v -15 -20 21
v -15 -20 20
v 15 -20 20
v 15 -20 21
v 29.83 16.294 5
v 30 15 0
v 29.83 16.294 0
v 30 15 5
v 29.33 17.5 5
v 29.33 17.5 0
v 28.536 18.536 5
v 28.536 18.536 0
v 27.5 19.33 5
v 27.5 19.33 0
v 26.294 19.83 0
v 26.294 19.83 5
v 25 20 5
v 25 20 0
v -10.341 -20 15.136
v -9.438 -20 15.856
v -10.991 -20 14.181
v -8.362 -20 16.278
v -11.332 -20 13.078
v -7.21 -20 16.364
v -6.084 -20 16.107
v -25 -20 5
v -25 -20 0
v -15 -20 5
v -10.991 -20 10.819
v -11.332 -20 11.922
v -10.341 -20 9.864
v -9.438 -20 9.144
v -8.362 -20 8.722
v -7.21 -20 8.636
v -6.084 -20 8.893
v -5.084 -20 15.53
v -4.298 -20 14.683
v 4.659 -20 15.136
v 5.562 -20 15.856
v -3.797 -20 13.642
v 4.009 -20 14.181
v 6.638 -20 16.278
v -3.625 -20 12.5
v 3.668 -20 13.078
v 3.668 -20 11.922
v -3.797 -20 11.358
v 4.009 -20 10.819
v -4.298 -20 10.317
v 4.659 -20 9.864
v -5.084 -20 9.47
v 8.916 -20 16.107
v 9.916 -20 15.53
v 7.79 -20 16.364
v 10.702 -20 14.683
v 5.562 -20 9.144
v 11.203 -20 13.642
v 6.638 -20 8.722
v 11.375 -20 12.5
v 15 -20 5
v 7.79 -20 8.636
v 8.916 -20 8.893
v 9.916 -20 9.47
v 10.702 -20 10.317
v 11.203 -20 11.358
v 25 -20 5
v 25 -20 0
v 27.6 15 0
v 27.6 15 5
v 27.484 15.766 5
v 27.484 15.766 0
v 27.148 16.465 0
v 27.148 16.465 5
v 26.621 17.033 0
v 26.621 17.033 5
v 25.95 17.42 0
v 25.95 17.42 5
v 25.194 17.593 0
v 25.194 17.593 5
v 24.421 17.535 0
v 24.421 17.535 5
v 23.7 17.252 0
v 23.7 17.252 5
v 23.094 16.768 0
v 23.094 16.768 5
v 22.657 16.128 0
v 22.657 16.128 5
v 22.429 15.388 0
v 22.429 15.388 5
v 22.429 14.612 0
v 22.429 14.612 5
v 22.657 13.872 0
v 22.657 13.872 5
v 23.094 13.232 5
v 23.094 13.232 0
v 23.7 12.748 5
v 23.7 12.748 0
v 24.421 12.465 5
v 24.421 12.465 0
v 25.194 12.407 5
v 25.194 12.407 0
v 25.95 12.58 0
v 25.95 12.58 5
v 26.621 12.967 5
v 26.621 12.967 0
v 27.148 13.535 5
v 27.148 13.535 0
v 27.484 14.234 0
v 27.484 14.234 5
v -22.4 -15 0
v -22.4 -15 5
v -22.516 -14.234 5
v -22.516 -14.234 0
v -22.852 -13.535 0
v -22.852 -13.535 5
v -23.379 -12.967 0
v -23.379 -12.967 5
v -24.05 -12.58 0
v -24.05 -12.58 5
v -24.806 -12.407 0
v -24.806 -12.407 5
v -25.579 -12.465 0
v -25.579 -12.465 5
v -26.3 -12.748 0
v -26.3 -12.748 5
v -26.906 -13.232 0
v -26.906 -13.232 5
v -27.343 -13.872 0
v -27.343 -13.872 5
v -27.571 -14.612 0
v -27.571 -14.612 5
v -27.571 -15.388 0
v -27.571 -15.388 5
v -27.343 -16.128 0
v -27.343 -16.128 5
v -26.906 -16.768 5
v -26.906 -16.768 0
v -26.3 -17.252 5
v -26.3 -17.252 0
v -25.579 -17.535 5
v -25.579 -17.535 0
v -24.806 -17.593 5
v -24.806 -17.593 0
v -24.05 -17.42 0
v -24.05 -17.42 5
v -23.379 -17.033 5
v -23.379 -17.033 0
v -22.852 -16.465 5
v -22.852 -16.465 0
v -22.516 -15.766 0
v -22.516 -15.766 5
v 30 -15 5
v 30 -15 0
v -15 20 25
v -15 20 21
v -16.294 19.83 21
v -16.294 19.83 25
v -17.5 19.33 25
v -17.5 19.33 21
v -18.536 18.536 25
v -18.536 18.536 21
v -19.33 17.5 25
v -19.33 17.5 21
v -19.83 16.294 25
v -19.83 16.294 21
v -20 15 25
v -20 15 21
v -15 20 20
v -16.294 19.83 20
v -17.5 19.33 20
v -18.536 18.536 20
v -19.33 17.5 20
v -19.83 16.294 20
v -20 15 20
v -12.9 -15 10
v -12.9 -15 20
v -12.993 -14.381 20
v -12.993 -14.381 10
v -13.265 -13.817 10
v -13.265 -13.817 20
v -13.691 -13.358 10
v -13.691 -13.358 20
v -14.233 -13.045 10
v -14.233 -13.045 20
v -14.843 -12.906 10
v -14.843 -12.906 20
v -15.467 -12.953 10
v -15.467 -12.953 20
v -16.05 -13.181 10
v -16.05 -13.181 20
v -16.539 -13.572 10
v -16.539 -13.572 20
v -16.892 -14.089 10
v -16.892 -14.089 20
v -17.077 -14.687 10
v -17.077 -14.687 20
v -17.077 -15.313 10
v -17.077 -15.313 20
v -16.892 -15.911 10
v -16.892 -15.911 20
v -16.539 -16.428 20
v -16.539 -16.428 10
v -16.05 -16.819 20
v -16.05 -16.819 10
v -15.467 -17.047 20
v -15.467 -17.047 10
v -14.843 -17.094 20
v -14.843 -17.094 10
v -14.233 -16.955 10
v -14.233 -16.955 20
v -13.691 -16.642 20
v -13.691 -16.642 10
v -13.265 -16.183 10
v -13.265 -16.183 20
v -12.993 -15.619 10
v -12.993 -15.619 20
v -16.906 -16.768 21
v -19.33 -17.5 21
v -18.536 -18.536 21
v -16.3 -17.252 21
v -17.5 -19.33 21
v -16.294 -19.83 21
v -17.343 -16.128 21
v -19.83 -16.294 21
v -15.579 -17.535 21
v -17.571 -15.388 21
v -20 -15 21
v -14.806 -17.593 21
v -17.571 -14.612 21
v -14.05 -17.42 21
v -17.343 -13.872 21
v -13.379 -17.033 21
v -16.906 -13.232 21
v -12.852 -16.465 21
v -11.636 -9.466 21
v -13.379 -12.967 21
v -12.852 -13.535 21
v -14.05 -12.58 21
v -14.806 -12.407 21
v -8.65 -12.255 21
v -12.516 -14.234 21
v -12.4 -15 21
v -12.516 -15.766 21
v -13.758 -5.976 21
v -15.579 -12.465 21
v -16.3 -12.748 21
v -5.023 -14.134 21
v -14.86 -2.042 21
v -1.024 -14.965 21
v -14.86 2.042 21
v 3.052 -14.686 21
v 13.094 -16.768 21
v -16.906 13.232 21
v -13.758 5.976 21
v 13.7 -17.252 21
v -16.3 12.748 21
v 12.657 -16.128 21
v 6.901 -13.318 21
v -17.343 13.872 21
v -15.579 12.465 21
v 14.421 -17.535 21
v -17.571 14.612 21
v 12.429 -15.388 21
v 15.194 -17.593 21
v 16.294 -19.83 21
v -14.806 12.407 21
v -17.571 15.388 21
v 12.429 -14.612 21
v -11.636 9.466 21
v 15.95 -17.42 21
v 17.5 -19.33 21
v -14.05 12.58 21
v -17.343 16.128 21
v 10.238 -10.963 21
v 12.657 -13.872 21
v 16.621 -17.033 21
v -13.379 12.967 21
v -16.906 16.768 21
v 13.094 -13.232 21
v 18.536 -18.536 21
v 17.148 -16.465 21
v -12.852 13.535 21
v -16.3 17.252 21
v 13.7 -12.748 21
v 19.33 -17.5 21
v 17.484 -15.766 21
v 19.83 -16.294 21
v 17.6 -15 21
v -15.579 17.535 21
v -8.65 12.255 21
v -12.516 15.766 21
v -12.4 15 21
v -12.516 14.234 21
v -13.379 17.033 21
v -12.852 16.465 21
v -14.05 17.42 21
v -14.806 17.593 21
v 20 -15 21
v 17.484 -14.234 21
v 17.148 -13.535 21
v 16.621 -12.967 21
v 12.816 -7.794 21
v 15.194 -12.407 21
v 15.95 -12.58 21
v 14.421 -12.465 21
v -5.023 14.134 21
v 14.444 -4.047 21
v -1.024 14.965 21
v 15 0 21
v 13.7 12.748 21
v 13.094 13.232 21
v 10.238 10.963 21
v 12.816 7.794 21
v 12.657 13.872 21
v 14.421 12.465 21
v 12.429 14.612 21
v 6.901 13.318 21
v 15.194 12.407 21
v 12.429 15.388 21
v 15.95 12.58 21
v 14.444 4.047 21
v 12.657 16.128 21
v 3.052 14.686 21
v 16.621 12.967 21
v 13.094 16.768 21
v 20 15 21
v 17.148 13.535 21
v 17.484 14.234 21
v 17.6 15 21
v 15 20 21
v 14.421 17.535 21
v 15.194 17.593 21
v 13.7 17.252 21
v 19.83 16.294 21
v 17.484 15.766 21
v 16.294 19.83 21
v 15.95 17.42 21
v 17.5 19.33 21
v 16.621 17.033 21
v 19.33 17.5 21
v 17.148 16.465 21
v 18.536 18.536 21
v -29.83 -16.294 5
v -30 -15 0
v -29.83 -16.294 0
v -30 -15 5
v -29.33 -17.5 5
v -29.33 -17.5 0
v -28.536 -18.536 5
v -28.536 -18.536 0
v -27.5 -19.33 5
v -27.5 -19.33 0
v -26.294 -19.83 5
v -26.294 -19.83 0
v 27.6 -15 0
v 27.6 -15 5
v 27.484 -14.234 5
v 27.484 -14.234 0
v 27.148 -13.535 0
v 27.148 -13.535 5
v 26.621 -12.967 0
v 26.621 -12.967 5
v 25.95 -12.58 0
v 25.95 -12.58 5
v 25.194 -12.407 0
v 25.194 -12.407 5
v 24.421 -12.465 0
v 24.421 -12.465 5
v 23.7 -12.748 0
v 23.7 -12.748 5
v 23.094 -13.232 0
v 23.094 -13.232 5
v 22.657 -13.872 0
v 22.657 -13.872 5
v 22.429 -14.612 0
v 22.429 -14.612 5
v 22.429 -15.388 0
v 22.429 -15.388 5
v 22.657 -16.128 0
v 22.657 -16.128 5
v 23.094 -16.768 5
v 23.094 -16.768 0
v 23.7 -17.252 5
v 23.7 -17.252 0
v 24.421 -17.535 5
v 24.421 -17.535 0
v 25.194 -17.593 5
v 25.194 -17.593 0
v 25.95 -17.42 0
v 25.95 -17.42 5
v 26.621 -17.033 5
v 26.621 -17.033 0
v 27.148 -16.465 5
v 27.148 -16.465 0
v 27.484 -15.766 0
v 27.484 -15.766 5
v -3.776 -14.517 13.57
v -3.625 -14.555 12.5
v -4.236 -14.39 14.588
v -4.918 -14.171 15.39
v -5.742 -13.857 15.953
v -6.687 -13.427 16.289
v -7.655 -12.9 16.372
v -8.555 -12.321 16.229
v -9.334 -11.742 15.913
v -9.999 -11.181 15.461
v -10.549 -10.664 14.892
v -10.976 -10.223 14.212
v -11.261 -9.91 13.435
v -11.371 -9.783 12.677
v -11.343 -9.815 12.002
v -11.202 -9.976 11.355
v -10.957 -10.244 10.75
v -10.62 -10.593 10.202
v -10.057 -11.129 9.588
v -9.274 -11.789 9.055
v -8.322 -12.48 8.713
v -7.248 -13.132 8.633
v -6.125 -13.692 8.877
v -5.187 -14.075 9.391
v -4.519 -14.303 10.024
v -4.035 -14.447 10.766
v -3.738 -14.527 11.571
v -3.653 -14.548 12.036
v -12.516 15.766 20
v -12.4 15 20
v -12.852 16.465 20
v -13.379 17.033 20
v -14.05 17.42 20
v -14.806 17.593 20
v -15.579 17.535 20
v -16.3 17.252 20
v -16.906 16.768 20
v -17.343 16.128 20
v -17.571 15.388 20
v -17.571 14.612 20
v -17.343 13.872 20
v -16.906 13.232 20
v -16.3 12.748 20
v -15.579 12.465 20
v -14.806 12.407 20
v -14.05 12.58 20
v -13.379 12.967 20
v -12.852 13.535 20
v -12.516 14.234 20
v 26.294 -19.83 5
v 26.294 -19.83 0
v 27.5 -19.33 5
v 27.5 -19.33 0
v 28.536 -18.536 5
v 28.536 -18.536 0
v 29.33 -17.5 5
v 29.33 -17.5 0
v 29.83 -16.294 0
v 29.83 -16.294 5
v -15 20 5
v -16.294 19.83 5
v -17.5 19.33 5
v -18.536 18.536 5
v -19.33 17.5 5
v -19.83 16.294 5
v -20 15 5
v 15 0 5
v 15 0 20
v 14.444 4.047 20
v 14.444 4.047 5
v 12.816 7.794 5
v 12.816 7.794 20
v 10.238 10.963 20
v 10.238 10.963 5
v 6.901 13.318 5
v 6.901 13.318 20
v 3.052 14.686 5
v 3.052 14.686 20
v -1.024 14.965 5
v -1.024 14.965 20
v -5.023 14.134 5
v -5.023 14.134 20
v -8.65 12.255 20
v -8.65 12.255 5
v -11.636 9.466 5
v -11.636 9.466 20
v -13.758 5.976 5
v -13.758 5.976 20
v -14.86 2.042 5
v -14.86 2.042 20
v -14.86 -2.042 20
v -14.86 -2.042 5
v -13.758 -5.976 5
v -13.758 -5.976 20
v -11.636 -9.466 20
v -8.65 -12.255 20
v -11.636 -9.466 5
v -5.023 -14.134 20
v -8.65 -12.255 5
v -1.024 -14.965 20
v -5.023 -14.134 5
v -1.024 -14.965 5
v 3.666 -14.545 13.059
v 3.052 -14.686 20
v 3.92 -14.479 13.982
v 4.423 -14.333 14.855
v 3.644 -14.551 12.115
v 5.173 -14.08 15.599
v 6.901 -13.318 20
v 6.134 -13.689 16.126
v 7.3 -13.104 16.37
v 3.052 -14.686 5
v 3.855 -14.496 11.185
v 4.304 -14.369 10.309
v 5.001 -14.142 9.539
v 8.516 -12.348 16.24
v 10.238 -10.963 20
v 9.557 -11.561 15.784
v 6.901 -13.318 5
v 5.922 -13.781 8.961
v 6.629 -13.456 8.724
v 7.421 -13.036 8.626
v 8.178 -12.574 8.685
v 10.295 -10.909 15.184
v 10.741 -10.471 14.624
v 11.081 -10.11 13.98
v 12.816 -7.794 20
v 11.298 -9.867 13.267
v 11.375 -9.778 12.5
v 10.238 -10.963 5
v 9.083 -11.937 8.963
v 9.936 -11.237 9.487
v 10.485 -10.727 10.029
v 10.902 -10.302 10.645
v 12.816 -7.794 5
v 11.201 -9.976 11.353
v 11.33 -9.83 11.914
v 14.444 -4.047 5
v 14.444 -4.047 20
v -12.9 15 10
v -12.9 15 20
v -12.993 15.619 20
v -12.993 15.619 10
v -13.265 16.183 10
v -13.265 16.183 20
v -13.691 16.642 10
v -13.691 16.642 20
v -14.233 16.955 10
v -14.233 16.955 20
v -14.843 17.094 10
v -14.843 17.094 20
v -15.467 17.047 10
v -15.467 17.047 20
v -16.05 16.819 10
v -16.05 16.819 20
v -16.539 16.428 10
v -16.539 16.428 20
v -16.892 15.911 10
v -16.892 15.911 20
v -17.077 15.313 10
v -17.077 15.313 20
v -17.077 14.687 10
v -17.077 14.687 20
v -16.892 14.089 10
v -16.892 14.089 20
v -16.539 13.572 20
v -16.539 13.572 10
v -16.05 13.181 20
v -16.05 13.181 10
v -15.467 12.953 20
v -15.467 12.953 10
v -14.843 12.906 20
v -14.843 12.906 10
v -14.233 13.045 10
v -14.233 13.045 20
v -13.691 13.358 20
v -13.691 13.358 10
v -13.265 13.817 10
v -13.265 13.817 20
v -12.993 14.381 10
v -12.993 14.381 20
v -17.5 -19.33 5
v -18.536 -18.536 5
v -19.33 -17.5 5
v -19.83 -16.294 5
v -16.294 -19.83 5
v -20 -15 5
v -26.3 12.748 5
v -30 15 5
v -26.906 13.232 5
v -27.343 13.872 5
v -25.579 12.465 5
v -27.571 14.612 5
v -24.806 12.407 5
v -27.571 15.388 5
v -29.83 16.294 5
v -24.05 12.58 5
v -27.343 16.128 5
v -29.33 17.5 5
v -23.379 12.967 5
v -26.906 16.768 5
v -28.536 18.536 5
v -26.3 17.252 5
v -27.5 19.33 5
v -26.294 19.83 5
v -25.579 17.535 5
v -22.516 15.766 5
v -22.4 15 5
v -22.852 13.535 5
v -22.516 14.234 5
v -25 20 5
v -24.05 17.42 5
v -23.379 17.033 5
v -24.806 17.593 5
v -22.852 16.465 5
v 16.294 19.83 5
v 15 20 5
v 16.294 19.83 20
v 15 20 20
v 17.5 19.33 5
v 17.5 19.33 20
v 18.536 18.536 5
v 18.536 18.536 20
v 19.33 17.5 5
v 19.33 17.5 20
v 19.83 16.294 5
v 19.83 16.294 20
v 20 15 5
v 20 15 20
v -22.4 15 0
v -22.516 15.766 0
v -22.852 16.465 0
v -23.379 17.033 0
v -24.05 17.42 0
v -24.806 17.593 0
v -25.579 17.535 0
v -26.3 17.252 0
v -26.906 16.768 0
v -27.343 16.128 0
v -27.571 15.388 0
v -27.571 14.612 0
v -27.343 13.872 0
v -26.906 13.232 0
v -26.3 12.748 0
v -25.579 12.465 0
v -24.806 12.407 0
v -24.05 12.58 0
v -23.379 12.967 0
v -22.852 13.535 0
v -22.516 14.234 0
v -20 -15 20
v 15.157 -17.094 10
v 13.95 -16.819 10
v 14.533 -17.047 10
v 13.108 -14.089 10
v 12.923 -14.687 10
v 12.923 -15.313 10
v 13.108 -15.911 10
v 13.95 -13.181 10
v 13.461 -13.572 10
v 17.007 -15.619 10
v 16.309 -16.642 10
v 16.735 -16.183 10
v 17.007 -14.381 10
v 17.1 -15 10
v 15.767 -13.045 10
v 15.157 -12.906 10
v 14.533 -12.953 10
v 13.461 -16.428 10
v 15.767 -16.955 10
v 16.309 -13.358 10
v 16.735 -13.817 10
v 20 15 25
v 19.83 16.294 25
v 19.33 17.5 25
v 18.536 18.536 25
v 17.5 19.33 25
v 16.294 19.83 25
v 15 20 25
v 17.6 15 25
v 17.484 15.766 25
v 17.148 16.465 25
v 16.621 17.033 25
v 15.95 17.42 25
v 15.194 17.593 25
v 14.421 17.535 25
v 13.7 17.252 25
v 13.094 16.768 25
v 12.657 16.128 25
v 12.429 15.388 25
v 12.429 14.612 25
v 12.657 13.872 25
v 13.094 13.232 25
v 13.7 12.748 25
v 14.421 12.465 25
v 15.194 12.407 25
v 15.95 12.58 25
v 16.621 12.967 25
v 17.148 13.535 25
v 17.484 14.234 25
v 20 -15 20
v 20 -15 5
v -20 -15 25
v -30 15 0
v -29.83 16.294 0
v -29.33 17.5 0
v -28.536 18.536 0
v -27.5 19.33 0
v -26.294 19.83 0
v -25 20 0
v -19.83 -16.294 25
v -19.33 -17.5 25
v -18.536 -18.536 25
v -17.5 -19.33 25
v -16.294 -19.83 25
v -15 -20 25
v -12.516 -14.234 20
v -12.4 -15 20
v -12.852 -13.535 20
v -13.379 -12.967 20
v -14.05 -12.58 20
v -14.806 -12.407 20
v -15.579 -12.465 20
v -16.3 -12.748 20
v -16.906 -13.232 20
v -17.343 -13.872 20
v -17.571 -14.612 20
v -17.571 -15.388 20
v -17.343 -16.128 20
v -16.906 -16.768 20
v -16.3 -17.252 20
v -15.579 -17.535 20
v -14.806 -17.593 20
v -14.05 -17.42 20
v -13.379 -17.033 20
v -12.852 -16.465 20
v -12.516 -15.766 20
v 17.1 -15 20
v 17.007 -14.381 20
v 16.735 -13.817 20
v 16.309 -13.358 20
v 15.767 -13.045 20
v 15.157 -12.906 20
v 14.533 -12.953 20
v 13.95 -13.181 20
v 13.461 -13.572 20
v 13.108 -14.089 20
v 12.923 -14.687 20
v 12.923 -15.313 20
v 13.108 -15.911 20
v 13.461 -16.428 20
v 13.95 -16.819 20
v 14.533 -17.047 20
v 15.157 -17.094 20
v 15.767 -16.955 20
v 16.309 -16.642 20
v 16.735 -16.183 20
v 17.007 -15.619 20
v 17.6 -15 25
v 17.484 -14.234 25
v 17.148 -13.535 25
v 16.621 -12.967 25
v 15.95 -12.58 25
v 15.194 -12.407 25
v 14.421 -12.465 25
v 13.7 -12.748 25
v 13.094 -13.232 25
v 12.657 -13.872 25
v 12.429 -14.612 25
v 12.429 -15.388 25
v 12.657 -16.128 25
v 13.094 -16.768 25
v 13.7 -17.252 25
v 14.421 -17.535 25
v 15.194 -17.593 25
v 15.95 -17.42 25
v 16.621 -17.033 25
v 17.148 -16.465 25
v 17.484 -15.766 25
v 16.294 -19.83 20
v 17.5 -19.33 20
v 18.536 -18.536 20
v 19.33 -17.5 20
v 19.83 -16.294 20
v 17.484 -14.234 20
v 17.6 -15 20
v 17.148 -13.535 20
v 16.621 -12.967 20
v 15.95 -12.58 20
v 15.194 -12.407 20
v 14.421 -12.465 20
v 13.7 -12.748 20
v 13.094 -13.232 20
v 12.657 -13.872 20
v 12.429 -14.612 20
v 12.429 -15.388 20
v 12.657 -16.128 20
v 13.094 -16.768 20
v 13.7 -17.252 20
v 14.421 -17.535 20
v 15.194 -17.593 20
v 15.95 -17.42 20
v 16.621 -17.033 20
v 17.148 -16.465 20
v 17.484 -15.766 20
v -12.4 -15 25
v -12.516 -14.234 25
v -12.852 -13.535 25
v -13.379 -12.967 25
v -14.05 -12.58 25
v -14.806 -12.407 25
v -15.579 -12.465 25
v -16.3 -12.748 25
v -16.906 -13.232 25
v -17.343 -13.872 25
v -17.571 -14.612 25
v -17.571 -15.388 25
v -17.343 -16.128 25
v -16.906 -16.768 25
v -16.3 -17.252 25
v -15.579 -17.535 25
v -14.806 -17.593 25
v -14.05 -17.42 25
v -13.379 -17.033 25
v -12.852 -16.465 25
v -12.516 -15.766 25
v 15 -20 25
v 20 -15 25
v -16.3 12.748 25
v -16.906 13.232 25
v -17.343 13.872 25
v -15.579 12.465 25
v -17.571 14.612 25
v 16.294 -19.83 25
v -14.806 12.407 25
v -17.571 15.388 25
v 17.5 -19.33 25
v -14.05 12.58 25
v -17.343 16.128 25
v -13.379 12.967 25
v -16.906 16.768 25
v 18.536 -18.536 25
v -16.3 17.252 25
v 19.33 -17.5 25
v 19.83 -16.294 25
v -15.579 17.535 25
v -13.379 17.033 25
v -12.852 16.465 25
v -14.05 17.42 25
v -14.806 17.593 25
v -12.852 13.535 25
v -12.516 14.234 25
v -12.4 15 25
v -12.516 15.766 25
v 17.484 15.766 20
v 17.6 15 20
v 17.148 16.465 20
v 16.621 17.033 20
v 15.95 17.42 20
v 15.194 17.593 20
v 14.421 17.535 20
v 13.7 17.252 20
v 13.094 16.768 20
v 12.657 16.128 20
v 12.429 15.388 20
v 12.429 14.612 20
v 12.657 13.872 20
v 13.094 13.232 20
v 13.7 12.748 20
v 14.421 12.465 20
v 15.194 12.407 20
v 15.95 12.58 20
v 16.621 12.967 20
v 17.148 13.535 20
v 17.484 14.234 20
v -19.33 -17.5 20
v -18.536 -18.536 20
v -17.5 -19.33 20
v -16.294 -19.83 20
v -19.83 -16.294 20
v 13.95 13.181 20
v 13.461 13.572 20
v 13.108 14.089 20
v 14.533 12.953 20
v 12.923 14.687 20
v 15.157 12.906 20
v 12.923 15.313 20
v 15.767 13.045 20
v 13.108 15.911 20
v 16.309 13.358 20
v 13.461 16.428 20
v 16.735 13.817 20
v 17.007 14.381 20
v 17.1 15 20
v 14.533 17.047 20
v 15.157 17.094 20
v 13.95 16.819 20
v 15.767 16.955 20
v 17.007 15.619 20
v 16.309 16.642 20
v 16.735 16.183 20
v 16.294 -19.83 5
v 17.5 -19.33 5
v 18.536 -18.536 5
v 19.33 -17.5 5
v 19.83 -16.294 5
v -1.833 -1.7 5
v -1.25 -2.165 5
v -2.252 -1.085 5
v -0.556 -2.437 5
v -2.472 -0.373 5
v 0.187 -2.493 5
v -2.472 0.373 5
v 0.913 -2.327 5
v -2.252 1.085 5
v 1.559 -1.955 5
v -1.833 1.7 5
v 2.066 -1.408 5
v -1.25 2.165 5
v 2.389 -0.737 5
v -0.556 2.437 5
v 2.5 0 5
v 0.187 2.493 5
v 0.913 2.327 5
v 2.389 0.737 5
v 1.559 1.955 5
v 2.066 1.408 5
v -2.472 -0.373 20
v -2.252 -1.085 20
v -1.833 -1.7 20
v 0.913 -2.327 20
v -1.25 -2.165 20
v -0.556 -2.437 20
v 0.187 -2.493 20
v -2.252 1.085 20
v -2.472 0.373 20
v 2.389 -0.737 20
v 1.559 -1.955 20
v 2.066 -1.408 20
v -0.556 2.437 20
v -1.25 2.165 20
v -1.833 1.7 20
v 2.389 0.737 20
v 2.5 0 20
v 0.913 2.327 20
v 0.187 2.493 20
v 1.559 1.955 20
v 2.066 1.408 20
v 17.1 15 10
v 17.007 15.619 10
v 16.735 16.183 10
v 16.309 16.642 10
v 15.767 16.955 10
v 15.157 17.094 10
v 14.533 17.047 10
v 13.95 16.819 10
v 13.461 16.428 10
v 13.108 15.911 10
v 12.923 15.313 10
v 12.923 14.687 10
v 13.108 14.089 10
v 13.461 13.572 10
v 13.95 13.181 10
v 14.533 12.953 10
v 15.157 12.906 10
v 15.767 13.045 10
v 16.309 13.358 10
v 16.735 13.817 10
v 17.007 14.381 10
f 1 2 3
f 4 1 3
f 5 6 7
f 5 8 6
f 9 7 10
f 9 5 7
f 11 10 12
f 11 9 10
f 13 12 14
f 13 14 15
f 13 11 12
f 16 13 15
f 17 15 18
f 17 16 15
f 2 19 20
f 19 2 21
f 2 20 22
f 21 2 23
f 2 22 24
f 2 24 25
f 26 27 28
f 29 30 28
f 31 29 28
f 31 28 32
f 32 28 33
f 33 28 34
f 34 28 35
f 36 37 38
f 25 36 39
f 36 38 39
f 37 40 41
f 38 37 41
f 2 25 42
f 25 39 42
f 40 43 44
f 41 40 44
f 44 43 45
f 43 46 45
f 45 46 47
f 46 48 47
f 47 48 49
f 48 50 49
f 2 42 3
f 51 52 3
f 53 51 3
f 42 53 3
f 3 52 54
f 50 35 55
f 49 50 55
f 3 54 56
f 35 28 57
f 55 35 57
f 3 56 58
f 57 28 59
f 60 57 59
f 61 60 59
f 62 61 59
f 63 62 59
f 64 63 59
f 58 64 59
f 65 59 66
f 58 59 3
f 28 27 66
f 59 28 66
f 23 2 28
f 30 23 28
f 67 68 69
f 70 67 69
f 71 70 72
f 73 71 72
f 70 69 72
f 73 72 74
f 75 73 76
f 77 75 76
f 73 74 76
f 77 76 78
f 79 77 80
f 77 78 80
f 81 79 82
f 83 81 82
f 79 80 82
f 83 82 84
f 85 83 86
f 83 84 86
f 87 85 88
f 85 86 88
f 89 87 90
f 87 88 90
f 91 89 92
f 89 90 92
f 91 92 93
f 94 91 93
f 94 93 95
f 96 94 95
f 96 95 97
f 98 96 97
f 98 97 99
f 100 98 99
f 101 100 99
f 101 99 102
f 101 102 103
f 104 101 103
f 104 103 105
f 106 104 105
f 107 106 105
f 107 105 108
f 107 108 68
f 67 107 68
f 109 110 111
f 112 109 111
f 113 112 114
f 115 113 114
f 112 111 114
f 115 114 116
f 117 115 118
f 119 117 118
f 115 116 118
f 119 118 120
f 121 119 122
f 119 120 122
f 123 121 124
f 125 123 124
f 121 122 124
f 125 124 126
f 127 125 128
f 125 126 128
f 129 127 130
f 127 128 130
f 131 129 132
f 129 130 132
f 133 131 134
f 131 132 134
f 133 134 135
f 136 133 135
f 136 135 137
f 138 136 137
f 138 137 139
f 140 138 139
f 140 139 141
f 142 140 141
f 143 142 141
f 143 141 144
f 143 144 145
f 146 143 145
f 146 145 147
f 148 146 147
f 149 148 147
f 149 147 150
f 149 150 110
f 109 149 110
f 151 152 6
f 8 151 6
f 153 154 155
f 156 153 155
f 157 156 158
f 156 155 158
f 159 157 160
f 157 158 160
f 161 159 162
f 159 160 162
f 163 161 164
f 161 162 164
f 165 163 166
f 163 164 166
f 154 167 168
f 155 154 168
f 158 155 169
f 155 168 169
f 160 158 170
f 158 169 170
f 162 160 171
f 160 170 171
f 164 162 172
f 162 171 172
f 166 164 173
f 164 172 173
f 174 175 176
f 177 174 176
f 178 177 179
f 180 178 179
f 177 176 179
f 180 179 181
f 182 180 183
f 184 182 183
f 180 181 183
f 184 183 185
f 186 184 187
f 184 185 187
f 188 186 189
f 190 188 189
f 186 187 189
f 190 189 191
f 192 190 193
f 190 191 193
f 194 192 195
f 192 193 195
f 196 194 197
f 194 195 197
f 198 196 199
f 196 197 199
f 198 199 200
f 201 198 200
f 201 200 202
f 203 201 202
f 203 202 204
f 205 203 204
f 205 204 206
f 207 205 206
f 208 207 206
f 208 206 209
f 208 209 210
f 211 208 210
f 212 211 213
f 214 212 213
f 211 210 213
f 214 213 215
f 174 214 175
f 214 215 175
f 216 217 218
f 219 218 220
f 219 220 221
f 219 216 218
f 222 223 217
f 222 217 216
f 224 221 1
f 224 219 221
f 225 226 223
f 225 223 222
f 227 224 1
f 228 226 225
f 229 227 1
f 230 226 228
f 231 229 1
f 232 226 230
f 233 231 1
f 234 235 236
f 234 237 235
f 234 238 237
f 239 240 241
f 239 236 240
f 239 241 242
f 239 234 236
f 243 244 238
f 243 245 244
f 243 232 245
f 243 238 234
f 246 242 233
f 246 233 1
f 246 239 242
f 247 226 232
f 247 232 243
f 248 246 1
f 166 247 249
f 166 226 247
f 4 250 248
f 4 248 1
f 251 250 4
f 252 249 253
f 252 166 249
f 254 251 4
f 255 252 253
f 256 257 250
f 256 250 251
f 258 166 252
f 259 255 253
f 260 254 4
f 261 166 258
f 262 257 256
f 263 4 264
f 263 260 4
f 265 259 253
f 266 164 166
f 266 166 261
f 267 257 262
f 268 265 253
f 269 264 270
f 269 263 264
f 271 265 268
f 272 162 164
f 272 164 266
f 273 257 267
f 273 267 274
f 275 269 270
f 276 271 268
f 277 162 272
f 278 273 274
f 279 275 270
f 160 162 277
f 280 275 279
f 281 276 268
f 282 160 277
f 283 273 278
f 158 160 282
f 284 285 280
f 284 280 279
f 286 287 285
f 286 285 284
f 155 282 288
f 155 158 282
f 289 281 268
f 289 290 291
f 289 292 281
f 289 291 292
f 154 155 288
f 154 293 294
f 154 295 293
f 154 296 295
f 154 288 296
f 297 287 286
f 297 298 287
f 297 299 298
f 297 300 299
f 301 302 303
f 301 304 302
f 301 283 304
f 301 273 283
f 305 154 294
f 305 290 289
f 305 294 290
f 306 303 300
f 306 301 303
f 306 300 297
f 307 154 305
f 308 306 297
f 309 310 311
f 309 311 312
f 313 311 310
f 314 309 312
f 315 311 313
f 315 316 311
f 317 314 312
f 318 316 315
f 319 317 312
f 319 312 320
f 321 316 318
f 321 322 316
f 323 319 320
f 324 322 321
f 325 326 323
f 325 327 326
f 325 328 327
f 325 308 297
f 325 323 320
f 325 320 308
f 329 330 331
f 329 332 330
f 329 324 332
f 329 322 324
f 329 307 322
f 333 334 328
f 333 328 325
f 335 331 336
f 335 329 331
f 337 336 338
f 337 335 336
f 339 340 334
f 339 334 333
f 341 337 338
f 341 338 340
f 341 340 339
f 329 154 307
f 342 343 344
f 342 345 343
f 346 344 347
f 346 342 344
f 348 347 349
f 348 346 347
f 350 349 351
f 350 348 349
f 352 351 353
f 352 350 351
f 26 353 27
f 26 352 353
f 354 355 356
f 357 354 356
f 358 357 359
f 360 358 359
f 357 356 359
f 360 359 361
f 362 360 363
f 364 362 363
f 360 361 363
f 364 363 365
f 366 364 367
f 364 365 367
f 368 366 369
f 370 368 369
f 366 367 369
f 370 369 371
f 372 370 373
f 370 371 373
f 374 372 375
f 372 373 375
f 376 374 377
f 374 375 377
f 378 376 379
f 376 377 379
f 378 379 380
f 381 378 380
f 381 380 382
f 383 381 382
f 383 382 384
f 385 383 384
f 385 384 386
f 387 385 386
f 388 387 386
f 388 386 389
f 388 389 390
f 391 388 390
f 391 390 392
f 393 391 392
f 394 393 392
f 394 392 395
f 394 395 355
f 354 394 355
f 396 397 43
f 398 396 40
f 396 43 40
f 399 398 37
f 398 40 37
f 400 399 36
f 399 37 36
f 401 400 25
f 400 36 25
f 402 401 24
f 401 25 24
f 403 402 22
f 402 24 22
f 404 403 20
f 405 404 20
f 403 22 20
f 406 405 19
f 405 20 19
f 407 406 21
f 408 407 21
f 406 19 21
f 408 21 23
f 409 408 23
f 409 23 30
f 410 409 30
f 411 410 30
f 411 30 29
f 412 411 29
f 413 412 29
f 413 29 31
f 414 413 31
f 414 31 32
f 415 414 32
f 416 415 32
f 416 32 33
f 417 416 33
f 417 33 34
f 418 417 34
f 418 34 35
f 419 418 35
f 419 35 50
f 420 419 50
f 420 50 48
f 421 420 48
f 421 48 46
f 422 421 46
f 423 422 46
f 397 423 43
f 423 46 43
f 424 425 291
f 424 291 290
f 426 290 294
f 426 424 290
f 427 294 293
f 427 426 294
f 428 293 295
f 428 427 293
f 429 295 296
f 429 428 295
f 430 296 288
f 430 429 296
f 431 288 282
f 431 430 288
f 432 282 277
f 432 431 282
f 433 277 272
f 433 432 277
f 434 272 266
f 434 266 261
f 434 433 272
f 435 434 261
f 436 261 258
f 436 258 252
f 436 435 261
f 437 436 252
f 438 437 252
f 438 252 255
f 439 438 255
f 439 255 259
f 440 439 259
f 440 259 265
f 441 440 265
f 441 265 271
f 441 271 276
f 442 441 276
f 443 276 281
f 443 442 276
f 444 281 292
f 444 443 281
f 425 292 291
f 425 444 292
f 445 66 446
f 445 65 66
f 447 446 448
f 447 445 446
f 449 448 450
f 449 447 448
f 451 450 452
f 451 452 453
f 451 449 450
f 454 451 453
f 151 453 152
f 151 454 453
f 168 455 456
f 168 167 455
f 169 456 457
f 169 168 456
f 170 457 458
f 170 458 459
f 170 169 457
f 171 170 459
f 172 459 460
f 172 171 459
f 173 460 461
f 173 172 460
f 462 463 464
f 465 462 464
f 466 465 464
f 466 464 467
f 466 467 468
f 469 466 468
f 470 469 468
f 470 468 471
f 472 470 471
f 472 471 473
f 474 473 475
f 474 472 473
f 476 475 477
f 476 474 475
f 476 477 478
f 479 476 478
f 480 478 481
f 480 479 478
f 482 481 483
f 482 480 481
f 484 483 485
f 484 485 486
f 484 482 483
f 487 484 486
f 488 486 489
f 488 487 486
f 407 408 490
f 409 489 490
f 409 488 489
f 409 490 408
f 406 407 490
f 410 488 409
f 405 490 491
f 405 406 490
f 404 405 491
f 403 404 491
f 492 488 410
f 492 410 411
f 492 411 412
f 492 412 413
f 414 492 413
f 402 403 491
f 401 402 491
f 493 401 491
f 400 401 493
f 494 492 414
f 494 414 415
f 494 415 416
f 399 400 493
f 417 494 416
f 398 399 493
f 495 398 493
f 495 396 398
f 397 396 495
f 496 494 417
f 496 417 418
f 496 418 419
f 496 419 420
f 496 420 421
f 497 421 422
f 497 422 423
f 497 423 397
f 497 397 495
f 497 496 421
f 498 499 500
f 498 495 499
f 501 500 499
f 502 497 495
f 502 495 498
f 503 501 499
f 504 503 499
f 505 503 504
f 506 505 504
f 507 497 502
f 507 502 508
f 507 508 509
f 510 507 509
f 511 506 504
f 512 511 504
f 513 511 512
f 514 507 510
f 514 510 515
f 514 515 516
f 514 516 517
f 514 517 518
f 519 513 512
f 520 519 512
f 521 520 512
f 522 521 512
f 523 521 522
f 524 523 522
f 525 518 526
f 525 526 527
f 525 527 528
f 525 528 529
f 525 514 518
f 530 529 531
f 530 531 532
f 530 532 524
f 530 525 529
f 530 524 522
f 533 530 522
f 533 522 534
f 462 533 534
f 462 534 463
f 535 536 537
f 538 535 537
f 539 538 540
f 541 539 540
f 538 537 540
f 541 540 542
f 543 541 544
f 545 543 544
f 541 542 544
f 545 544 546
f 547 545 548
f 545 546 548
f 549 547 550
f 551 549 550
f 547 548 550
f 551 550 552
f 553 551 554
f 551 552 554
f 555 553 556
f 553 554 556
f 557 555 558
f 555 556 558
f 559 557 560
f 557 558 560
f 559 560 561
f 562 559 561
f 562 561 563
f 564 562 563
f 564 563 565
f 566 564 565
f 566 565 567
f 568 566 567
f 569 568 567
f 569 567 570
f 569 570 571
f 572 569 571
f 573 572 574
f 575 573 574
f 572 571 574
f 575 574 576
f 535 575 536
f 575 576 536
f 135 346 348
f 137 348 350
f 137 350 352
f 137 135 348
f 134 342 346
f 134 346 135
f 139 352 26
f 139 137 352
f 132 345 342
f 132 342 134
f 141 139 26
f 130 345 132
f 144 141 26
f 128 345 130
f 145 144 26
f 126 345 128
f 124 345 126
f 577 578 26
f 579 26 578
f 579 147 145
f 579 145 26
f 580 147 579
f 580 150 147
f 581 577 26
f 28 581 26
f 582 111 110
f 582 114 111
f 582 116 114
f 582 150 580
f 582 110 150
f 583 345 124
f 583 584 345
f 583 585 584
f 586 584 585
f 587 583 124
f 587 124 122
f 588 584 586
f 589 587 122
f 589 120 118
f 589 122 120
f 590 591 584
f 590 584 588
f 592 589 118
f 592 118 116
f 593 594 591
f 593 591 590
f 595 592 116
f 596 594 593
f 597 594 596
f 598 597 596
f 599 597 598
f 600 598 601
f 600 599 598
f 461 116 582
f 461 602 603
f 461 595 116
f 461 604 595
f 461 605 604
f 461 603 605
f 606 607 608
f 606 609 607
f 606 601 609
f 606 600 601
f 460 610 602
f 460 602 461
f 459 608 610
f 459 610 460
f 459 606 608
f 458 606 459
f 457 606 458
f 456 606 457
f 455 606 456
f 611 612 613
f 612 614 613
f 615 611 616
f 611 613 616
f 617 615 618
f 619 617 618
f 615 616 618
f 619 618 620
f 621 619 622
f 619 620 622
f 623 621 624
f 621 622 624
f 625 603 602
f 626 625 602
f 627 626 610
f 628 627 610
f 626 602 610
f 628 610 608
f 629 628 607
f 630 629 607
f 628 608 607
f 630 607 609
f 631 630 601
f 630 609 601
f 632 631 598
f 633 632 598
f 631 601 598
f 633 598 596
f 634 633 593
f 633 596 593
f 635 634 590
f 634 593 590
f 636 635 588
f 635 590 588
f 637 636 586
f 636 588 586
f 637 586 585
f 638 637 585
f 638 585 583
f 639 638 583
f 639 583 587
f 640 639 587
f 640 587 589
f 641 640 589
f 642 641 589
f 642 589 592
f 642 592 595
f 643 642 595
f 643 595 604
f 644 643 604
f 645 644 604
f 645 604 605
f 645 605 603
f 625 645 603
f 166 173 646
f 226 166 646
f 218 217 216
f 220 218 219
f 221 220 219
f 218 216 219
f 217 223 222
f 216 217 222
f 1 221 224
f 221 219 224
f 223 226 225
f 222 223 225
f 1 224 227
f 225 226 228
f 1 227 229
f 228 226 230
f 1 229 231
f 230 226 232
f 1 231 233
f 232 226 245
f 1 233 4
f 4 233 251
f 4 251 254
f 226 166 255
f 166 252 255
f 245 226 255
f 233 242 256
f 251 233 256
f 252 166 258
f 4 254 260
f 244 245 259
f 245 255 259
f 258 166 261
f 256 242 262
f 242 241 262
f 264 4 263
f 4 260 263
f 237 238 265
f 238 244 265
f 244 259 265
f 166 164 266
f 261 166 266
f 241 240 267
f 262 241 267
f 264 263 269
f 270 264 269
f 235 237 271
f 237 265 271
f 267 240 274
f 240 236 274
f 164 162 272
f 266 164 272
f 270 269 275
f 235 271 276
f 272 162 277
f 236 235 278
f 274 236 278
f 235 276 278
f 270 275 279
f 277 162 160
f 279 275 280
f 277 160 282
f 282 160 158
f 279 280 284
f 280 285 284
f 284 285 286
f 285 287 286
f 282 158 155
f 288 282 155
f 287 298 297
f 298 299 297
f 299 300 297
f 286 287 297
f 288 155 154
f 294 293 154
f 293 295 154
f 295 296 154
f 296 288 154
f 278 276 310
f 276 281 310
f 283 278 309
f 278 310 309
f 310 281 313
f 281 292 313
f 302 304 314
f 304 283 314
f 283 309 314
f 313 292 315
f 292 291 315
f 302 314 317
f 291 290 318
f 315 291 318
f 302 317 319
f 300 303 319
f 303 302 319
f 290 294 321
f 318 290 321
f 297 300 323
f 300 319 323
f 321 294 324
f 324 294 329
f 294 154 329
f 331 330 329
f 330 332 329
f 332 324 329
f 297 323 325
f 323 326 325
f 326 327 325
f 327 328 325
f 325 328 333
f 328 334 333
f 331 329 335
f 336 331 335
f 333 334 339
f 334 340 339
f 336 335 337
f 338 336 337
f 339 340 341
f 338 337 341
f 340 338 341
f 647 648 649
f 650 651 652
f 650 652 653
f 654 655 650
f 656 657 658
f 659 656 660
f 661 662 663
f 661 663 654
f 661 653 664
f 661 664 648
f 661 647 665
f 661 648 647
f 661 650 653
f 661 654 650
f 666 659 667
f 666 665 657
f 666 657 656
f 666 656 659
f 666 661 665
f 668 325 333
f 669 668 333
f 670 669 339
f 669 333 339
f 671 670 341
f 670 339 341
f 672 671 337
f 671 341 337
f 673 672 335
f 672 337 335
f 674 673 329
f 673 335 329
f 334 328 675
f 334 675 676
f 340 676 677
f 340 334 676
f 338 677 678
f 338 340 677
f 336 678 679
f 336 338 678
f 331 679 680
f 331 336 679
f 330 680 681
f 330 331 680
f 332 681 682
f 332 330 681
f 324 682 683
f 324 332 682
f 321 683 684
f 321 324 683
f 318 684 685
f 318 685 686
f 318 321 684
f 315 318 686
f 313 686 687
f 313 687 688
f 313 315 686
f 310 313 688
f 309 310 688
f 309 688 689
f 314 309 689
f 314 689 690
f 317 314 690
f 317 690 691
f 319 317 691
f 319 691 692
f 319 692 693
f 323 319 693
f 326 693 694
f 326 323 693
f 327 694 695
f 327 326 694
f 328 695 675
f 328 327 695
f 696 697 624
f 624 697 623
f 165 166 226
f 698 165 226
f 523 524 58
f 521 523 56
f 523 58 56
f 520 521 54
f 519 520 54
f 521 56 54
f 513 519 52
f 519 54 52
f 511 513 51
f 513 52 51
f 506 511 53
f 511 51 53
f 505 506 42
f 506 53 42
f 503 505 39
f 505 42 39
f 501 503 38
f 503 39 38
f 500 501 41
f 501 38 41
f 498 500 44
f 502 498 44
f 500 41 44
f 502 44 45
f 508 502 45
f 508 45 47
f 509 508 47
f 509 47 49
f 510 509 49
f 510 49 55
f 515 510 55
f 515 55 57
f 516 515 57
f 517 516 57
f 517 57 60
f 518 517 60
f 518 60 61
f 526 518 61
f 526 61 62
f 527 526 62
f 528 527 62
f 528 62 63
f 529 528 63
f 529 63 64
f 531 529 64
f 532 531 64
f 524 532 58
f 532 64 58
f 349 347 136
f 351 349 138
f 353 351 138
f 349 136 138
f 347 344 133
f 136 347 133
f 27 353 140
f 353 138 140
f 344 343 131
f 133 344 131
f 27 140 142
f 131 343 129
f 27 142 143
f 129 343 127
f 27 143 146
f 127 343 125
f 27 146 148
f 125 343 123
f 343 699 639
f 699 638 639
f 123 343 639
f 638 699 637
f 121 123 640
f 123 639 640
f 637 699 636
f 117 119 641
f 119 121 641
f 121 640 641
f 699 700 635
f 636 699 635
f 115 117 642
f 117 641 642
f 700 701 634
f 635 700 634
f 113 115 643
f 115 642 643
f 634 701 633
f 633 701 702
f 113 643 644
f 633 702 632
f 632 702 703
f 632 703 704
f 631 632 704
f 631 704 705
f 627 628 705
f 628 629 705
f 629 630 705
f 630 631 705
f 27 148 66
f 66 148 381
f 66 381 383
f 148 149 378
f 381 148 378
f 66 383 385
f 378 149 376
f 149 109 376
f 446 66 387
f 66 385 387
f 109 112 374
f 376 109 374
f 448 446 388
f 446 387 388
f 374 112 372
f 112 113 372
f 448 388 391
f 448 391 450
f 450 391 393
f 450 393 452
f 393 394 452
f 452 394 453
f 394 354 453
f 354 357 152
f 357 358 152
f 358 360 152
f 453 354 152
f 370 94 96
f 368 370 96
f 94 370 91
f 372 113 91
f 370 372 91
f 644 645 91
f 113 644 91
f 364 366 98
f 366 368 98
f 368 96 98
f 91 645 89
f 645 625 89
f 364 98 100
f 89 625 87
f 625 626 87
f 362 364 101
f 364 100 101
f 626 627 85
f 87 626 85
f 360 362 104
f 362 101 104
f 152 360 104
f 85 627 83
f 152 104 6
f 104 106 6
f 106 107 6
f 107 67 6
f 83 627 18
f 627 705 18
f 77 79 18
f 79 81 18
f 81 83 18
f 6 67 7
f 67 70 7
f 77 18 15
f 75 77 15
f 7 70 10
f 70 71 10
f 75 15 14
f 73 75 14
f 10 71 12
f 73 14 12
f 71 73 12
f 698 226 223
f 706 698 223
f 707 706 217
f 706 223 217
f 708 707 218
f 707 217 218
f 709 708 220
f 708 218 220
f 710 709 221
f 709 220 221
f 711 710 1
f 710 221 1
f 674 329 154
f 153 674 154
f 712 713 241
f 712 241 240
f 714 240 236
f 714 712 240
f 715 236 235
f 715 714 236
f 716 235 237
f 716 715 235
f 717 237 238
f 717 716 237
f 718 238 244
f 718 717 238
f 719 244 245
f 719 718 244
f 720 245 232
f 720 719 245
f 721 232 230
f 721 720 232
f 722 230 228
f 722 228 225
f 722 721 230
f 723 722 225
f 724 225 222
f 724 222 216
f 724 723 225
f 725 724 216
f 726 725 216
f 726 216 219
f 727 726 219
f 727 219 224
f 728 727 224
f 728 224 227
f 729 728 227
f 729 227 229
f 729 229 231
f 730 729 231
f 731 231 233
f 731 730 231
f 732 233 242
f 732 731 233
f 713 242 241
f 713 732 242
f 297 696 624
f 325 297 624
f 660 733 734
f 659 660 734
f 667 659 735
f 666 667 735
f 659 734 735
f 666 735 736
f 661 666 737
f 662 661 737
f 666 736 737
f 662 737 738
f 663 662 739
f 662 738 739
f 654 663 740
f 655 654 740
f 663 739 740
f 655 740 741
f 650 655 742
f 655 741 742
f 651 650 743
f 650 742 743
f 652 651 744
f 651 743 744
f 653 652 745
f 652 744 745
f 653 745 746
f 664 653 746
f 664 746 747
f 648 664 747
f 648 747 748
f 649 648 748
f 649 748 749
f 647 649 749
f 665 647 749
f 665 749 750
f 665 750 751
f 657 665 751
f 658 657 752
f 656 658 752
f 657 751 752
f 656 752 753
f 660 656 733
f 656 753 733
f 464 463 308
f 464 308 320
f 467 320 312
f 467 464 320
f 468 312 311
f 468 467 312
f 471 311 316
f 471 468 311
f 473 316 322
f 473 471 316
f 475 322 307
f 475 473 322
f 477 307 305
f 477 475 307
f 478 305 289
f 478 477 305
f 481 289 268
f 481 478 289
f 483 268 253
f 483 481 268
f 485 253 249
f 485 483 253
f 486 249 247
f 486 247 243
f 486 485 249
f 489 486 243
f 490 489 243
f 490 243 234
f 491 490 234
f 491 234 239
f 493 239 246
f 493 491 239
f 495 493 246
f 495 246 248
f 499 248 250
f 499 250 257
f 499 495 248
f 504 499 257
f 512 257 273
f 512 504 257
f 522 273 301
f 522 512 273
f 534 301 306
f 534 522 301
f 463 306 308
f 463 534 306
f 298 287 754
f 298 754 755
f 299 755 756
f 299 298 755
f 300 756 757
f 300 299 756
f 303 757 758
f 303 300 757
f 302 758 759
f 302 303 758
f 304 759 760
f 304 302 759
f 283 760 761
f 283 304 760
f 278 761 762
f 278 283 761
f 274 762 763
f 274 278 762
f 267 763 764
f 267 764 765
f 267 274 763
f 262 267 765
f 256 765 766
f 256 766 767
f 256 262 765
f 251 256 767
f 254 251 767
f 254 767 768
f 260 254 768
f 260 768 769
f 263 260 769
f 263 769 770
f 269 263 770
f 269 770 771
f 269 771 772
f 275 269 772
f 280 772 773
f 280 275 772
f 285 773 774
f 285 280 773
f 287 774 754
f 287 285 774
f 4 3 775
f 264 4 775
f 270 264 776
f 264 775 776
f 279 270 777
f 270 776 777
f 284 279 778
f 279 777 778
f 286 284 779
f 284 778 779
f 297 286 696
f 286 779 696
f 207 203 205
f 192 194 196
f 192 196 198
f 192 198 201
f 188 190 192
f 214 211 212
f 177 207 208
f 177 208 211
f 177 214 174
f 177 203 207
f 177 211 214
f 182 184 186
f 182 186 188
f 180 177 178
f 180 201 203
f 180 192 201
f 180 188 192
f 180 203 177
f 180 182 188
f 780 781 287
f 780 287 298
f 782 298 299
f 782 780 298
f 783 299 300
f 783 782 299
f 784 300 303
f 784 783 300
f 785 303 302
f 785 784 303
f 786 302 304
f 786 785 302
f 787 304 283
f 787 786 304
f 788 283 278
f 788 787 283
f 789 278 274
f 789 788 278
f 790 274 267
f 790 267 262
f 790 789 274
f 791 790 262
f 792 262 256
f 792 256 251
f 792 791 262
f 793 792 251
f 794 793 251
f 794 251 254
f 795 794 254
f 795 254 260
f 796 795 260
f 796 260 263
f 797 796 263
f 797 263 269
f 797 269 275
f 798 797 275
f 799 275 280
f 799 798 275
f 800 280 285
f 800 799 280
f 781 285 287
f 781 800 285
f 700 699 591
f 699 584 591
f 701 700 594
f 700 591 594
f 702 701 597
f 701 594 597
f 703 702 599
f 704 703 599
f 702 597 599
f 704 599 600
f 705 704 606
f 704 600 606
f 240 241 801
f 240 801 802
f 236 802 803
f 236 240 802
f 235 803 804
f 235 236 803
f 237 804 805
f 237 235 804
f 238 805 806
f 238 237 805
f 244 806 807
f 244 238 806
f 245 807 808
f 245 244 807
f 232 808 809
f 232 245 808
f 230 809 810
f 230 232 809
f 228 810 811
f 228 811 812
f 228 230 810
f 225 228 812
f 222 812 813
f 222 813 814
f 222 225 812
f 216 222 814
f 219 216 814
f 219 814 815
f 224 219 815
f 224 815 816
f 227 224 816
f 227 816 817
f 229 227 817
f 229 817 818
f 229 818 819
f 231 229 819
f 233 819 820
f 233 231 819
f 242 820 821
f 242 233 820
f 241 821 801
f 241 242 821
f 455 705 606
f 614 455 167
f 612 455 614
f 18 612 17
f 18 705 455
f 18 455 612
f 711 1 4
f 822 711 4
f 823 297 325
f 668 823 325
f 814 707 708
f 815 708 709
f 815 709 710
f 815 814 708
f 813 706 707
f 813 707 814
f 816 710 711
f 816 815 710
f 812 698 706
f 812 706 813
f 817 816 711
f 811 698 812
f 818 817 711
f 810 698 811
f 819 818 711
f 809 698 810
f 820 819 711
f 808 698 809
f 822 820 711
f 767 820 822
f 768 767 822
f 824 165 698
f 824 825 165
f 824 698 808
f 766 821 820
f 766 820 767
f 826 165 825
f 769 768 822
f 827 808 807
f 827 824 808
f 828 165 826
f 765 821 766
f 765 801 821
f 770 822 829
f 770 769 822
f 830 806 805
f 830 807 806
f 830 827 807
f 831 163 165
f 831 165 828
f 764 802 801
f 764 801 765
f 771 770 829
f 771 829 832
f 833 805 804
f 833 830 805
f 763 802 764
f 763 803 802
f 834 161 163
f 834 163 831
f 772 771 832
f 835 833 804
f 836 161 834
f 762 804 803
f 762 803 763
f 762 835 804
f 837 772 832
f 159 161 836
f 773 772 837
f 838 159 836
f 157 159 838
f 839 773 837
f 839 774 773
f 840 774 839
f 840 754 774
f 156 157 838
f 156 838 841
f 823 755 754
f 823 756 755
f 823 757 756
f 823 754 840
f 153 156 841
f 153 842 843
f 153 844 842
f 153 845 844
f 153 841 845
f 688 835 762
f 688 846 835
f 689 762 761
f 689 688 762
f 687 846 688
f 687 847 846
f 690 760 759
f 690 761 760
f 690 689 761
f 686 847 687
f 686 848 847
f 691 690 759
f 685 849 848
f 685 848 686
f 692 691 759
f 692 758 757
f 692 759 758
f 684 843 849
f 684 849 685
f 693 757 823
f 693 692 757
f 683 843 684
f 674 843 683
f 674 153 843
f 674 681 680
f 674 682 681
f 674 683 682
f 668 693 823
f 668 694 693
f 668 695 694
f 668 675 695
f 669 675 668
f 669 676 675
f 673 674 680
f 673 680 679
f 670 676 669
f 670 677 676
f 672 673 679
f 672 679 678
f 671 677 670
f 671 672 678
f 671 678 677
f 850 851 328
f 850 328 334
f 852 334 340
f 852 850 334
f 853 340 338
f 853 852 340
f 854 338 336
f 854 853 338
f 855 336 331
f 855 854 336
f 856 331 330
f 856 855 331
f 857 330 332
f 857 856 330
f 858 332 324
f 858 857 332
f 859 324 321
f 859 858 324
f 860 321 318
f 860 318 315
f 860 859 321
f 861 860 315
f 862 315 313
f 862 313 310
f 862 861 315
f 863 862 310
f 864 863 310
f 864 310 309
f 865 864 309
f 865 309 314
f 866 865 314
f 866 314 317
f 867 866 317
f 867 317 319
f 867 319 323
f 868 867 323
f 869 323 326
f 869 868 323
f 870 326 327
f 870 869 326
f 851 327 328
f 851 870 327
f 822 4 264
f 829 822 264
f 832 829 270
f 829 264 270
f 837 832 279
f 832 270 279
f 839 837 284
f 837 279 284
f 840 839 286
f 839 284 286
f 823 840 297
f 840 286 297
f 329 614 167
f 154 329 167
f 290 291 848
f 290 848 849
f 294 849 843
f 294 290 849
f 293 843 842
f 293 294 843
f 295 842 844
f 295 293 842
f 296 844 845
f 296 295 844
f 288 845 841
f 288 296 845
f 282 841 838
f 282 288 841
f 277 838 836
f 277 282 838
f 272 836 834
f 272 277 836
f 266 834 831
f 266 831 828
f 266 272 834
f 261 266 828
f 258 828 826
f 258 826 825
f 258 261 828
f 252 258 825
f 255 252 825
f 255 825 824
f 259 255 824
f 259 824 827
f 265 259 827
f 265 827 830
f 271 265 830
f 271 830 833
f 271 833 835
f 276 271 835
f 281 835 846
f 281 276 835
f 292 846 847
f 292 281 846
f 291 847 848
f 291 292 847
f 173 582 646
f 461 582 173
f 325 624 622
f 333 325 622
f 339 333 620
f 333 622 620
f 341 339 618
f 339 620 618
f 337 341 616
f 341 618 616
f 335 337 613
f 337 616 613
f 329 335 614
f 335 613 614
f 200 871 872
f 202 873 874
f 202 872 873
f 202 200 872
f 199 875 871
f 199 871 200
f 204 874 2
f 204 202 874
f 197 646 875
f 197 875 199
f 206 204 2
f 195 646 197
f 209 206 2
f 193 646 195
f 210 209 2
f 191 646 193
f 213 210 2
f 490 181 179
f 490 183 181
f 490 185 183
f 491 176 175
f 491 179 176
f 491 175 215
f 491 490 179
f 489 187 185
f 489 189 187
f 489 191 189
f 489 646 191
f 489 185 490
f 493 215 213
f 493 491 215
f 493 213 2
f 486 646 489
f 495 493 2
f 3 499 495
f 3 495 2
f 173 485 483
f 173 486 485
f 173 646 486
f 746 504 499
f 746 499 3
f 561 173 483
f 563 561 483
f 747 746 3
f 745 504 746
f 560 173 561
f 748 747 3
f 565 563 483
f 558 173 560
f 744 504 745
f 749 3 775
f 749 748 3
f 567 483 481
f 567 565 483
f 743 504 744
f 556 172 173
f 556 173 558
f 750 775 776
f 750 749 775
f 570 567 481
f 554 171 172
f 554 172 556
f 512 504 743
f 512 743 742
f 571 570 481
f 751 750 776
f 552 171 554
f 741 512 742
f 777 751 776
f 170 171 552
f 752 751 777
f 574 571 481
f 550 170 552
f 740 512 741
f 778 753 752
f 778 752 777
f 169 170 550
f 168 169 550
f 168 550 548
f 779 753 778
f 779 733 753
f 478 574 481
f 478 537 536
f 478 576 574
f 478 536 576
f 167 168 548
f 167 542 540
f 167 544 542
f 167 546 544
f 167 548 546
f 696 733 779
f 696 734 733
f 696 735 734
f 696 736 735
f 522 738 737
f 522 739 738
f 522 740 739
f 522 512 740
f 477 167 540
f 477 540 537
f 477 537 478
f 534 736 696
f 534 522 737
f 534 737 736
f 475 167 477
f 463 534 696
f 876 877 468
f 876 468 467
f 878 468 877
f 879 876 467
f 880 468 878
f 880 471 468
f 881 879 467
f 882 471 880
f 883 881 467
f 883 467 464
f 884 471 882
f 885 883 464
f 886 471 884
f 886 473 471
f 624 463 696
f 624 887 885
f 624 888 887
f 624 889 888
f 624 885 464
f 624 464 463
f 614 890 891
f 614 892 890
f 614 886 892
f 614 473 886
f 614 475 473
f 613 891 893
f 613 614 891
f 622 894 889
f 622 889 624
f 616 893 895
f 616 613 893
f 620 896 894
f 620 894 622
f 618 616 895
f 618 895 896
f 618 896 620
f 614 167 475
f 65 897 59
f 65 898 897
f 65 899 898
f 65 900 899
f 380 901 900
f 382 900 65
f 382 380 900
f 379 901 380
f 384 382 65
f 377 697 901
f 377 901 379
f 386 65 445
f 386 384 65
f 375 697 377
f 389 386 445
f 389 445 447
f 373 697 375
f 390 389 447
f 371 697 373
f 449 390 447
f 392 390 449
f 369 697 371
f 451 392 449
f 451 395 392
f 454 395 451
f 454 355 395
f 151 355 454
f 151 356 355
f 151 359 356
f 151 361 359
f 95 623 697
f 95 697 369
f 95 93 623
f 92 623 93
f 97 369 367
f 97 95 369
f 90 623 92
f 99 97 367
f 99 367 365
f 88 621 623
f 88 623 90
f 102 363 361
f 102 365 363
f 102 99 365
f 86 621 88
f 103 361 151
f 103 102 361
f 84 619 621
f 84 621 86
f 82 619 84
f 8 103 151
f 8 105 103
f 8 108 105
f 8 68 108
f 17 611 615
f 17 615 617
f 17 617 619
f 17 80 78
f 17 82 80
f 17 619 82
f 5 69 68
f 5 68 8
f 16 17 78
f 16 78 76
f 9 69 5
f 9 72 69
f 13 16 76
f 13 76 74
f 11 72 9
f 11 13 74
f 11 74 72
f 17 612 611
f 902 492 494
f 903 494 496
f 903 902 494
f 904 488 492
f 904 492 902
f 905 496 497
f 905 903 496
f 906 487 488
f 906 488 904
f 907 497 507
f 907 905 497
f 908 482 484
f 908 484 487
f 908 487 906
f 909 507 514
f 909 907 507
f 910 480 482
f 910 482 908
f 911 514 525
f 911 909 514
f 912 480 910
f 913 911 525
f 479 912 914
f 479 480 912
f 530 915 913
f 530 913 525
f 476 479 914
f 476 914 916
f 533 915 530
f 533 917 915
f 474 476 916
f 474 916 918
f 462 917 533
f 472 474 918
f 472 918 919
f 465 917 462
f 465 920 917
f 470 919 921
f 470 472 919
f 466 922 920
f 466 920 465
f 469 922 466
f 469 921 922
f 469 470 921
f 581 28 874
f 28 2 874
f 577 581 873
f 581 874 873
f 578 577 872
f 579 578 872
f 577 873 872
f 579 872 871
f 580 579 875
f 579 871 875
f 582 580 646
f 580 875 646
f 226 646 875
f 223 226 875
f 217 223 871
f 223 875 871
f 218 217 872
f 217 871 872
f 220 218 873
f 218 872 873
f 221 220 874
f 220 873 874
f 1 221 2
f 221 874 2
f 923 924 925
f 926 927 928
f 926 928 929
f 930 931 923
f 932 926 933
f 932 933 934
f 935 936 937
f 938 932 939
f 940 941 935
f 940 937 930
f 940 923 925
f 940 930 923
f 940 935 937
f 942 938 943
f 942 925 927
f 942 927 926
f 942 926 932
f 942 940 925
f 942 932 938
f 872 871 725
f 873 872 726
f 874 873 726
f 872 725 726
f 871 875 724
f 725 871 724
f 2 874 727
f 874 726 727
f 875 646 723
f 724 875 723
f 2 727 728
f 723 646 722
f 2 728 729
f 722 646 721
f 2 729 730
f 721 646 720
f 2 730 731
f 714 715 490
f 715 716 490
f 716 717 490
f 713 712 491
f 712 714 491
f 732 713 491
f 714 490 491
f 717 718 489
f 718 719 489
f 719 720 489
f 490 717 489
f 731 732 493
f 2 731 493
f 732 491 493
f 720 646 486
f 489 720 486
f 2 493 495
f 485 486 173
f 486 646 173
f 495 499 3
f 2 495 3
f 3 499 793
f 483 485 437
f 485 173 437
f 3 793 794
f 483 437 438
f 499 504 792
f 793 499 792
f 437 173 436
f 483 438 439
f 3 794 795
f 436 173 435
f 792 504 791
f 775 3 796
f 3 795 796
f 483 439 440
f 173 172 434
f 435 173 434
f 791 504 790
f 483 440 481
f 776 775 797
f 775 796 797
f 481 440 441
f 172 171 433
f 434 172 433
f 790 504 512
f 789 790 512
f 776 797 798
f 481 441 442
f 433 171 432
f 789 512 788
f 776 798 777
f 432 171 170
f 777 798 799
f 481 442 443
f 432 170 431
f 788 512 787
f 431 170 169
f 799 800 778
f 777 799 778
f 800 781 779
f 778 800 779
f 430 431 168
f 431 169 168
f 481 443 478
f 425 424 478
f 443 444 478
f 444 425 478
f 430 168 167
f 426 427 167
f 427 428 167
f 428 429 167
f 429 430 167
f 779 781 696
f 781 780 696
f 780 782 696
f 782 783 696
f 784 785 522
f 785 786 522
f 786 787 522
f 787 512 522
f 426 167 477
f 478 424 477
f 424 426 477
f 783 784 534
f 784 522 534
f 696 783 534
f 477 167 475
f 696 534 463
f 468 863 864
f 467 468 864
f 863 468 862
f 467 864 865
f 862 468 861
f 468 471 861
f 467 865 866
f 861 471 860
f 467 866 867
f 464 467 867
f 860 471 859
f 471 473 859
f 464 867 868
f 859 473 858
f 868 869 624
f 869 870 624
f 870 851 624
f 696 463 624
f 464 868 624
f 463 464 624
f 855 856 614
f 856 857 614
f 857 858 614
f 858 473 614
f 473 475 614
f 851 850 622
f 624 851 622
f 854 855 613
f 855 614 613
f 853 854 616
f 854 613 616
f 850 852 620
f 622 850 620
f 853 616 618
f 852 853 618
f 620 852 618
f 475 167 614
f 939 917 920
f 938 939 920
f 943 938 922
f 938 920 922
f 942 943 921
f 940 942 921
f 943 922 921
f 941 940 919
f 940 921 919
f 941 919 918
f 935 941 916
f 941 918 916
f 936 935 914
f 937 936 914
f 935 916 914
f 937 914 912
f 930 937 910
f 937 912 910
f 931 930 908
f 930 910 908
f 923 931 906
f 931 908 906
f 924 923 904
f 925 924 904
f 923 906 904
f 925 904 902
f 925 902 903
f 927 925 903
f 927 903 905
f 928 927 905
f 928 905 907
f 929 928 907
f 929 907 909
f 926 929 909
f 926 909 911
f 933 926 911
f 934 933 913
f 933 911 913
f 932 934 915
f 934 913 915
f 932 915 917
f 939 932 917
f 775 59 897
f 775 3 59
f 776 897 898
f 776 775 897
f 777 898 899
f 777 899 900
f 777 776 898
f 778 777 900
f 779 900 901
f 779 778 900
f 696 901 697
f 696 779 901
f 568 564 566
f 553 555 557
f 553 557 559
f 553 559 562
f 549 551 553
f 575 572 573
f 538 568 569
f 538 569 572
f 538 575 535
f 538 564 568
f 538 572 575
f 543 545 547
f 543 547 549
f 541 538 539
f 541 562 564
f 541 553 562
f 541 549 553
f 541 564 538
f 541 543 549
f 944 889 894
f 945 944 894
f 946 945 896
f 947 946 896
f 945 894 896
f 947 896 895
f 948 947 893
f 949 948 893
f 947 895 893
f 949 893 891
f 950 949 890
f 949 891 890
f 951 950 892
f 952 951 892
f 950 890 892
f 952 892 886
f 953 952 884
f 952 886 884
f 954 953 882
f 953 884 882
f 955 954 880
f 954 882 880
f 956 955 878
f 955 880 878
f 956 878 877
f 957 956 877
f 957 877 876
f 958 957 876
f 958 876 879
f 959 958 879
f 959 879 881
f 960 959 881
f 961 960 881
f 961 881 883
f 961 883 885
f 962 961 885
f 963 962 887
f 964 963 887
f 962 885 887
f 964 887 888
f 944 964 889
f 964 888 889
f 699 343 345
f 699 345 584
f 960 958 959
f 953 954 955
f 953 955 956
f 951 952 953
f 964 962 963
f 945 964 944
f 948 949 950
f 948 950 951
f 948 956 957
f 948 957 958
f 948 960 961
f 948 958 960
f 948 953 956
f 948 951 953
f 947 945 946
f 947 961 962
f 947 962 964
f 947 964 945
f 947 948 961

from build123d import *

# Parameters (mm, degrees)
F0_W      = 60
F0_H      = 40
F1_DEPTH  = 5
F2_R      = 5
F3_W      = 40
F3_H      = 40
F3_R      = 15
F3_R_2    = 2.5
F4_DEPTH  = 15
F5_R      = 5
F6_R      = 2.6
F7_DEPTH  = 25
F8_R      = 2.1
F9_DEPTH  = 10
F10_R     = 3.875
F11_DEPTH = 25
F12_R     = 2.6
F12_R_2   = 15
F13_DEPTH = 1
F14_R     = 2.6
F15_DEPTH = 4


with BuildPart() as f1:
    # F0 (on Top) → F1 (new body)
    with BuildSketch(Plane.XY):
        Rectangle(F0_W, F0_H)
    extrude(amount=F1_DEPTH)

    # F2
    f2_edges = [f1.edges().sort_by_distance(p)[0] for p in [
        (-30, 20, 2.5),
        (-30, -20, 2.5),
        (30, -20, 2.5),
        (30, 20, 2.5),
    ]]
    fillet(f2_edges, radius=F2_R)

    # F3 (on face) → F4 (join)
    with BuildSketch(Plane.XY.offset(5)):
        Rectangle(F3_W, F3_H)
        Circle(F3_R, mode=Mode.SUBTRACT)
        Circle(F3_R_2)
    extrude(amount=F4_DEPTH)

    # F5
    f5_edges = [f1.edges().sort_by_distance(p)[0] for p in [
        (-20, 20, 12.5),
        (-20, -20, 12.5),
        (20, -20, 12.5),
        (20, 20, 12.5),
    ]]
    fillet(f5_edges, radius=F5_R)

    # F6 (on face) → F7 (cut)
    with BuildSketch(Plane.XY.offset(5)):
        with Locations((-25, 15)):
            Circle(F6_R)
        with Locations((-25, -15)):
            Circle(F6_R)
        with Locations((25, 15)):
            Circle(F6_R)
        with Locations((25, -15)):
            Circle(F6_R)
    extrude(amount=-F7_DEPTH, mode=Mode.SUBTRACT)

    # F8 (on face) → F9 (cut)
    with BuildSketch(Plane.XY.offset(20)):
        with Locations((-15, 15)):
            Circle(F8_R)
        with Locations((-15, -15)):
            Circle(F8_R)
        with Locations((15, 15)):
            Circle(F8_R)
        with Locations((15, -15)):
            Circle(F8_R)
    extrude(amount=-F9_DEPTH, mode=Mode.SUBTRACT)

    # F10 (on face) → F11 (cut)
    with BuildSketch(Plane.XZ.offset(20)):
        with Locations((-7.5, 12.5)):
            Circle(F10_R)
        with Locations((7.5, 12.5)):
            Circle(F10_R)
    extrude(amount=-F11_DEPTH, mode=Mode.SUBTRACT)


with BuildPart() as f13:
    # F12 (on face) → F13 (new body)
    with BuildSketch(Plane.XY.offset(20)):
        with BuildLine():
            ThreePointArc((20, 15), (18.5355339059, 18.5355339059), (15, 20))
            Line((15, 20), (-15, 20))
            ThreePointArc((-15, 20), (-18.5355339059, 18.5355339059), (-20, 15))
            Line((-20, 15), (-20, -15))
            ThreePointArc((-20, -15), (-18.5355339059, -18.5355339059), (-15, -20))
            Line((-15, -20), (15, -20))
            ThreePointArc((15, -20), (18.5355339059, -18.5355339059), (20, -15))
            Line((20, -15), (20, 15))
        make_face()
        with Locations((-15, -15)):
            Circle(F12_R, mode=Mode.SUBTRACT)
        with Locations((15, -15)):
            Circle(F12_R, mode=Mode.SUBTRACT)
        with Locations((-15, 15)):
            Circle(F12_R, mode=Mode.SUBTRACT)
        Circle(F12_R_2, mode=Mode.SUBTRACT)
        with Locations((15, 15)):
            Circle(F12_R, mode=Mode.SUBTRACT)
    extrude(amount=F13_DEPTH)


with BuildPart() as f15:
    # F14 (on face) → F15 (new body)
    with BuildSketch(Plane.XY.offset(21)):
        with BuildLine():
            Line((20, -15), (20, 15))
            ThreePointArc((20, 15), (18.5355339059, 18.5355339059), (15, 20))
            Line((15, 20), (-15, 20))
            ThreePointArc((-15, 20), (-18.5355339059, 18.5355339059), (-20, 15))
            Line((-20, 15), (-20, -15))
            ThreePointArc((-20, -15), (-18.5355339059, -18.5355339059), (-15, -20))
            Line((-15, -20), (15, -20))
            ThreePointArc((15, -20), (18.5355339059, -18.5355339059), (20, -15))
        make_face()
        with Locations((-15, -15)):
            Circle(F14_R, mode=Mode.SUBTRACT)
        with Locations((15, -15)):
            Circle(F14_R, mode=Mode.SUBTRACT)
        with Locations((-15, 15)):
            Circle(F14_R, mode=Mode.SUBTRACT)
        with Locations((15, 15)):
            Circle(F14_R, mode=Mode.SUBTRACT)
    extrude(amount=F15_DEPTH)


solid = Compound([f1.part, f13.part, f15.part])
